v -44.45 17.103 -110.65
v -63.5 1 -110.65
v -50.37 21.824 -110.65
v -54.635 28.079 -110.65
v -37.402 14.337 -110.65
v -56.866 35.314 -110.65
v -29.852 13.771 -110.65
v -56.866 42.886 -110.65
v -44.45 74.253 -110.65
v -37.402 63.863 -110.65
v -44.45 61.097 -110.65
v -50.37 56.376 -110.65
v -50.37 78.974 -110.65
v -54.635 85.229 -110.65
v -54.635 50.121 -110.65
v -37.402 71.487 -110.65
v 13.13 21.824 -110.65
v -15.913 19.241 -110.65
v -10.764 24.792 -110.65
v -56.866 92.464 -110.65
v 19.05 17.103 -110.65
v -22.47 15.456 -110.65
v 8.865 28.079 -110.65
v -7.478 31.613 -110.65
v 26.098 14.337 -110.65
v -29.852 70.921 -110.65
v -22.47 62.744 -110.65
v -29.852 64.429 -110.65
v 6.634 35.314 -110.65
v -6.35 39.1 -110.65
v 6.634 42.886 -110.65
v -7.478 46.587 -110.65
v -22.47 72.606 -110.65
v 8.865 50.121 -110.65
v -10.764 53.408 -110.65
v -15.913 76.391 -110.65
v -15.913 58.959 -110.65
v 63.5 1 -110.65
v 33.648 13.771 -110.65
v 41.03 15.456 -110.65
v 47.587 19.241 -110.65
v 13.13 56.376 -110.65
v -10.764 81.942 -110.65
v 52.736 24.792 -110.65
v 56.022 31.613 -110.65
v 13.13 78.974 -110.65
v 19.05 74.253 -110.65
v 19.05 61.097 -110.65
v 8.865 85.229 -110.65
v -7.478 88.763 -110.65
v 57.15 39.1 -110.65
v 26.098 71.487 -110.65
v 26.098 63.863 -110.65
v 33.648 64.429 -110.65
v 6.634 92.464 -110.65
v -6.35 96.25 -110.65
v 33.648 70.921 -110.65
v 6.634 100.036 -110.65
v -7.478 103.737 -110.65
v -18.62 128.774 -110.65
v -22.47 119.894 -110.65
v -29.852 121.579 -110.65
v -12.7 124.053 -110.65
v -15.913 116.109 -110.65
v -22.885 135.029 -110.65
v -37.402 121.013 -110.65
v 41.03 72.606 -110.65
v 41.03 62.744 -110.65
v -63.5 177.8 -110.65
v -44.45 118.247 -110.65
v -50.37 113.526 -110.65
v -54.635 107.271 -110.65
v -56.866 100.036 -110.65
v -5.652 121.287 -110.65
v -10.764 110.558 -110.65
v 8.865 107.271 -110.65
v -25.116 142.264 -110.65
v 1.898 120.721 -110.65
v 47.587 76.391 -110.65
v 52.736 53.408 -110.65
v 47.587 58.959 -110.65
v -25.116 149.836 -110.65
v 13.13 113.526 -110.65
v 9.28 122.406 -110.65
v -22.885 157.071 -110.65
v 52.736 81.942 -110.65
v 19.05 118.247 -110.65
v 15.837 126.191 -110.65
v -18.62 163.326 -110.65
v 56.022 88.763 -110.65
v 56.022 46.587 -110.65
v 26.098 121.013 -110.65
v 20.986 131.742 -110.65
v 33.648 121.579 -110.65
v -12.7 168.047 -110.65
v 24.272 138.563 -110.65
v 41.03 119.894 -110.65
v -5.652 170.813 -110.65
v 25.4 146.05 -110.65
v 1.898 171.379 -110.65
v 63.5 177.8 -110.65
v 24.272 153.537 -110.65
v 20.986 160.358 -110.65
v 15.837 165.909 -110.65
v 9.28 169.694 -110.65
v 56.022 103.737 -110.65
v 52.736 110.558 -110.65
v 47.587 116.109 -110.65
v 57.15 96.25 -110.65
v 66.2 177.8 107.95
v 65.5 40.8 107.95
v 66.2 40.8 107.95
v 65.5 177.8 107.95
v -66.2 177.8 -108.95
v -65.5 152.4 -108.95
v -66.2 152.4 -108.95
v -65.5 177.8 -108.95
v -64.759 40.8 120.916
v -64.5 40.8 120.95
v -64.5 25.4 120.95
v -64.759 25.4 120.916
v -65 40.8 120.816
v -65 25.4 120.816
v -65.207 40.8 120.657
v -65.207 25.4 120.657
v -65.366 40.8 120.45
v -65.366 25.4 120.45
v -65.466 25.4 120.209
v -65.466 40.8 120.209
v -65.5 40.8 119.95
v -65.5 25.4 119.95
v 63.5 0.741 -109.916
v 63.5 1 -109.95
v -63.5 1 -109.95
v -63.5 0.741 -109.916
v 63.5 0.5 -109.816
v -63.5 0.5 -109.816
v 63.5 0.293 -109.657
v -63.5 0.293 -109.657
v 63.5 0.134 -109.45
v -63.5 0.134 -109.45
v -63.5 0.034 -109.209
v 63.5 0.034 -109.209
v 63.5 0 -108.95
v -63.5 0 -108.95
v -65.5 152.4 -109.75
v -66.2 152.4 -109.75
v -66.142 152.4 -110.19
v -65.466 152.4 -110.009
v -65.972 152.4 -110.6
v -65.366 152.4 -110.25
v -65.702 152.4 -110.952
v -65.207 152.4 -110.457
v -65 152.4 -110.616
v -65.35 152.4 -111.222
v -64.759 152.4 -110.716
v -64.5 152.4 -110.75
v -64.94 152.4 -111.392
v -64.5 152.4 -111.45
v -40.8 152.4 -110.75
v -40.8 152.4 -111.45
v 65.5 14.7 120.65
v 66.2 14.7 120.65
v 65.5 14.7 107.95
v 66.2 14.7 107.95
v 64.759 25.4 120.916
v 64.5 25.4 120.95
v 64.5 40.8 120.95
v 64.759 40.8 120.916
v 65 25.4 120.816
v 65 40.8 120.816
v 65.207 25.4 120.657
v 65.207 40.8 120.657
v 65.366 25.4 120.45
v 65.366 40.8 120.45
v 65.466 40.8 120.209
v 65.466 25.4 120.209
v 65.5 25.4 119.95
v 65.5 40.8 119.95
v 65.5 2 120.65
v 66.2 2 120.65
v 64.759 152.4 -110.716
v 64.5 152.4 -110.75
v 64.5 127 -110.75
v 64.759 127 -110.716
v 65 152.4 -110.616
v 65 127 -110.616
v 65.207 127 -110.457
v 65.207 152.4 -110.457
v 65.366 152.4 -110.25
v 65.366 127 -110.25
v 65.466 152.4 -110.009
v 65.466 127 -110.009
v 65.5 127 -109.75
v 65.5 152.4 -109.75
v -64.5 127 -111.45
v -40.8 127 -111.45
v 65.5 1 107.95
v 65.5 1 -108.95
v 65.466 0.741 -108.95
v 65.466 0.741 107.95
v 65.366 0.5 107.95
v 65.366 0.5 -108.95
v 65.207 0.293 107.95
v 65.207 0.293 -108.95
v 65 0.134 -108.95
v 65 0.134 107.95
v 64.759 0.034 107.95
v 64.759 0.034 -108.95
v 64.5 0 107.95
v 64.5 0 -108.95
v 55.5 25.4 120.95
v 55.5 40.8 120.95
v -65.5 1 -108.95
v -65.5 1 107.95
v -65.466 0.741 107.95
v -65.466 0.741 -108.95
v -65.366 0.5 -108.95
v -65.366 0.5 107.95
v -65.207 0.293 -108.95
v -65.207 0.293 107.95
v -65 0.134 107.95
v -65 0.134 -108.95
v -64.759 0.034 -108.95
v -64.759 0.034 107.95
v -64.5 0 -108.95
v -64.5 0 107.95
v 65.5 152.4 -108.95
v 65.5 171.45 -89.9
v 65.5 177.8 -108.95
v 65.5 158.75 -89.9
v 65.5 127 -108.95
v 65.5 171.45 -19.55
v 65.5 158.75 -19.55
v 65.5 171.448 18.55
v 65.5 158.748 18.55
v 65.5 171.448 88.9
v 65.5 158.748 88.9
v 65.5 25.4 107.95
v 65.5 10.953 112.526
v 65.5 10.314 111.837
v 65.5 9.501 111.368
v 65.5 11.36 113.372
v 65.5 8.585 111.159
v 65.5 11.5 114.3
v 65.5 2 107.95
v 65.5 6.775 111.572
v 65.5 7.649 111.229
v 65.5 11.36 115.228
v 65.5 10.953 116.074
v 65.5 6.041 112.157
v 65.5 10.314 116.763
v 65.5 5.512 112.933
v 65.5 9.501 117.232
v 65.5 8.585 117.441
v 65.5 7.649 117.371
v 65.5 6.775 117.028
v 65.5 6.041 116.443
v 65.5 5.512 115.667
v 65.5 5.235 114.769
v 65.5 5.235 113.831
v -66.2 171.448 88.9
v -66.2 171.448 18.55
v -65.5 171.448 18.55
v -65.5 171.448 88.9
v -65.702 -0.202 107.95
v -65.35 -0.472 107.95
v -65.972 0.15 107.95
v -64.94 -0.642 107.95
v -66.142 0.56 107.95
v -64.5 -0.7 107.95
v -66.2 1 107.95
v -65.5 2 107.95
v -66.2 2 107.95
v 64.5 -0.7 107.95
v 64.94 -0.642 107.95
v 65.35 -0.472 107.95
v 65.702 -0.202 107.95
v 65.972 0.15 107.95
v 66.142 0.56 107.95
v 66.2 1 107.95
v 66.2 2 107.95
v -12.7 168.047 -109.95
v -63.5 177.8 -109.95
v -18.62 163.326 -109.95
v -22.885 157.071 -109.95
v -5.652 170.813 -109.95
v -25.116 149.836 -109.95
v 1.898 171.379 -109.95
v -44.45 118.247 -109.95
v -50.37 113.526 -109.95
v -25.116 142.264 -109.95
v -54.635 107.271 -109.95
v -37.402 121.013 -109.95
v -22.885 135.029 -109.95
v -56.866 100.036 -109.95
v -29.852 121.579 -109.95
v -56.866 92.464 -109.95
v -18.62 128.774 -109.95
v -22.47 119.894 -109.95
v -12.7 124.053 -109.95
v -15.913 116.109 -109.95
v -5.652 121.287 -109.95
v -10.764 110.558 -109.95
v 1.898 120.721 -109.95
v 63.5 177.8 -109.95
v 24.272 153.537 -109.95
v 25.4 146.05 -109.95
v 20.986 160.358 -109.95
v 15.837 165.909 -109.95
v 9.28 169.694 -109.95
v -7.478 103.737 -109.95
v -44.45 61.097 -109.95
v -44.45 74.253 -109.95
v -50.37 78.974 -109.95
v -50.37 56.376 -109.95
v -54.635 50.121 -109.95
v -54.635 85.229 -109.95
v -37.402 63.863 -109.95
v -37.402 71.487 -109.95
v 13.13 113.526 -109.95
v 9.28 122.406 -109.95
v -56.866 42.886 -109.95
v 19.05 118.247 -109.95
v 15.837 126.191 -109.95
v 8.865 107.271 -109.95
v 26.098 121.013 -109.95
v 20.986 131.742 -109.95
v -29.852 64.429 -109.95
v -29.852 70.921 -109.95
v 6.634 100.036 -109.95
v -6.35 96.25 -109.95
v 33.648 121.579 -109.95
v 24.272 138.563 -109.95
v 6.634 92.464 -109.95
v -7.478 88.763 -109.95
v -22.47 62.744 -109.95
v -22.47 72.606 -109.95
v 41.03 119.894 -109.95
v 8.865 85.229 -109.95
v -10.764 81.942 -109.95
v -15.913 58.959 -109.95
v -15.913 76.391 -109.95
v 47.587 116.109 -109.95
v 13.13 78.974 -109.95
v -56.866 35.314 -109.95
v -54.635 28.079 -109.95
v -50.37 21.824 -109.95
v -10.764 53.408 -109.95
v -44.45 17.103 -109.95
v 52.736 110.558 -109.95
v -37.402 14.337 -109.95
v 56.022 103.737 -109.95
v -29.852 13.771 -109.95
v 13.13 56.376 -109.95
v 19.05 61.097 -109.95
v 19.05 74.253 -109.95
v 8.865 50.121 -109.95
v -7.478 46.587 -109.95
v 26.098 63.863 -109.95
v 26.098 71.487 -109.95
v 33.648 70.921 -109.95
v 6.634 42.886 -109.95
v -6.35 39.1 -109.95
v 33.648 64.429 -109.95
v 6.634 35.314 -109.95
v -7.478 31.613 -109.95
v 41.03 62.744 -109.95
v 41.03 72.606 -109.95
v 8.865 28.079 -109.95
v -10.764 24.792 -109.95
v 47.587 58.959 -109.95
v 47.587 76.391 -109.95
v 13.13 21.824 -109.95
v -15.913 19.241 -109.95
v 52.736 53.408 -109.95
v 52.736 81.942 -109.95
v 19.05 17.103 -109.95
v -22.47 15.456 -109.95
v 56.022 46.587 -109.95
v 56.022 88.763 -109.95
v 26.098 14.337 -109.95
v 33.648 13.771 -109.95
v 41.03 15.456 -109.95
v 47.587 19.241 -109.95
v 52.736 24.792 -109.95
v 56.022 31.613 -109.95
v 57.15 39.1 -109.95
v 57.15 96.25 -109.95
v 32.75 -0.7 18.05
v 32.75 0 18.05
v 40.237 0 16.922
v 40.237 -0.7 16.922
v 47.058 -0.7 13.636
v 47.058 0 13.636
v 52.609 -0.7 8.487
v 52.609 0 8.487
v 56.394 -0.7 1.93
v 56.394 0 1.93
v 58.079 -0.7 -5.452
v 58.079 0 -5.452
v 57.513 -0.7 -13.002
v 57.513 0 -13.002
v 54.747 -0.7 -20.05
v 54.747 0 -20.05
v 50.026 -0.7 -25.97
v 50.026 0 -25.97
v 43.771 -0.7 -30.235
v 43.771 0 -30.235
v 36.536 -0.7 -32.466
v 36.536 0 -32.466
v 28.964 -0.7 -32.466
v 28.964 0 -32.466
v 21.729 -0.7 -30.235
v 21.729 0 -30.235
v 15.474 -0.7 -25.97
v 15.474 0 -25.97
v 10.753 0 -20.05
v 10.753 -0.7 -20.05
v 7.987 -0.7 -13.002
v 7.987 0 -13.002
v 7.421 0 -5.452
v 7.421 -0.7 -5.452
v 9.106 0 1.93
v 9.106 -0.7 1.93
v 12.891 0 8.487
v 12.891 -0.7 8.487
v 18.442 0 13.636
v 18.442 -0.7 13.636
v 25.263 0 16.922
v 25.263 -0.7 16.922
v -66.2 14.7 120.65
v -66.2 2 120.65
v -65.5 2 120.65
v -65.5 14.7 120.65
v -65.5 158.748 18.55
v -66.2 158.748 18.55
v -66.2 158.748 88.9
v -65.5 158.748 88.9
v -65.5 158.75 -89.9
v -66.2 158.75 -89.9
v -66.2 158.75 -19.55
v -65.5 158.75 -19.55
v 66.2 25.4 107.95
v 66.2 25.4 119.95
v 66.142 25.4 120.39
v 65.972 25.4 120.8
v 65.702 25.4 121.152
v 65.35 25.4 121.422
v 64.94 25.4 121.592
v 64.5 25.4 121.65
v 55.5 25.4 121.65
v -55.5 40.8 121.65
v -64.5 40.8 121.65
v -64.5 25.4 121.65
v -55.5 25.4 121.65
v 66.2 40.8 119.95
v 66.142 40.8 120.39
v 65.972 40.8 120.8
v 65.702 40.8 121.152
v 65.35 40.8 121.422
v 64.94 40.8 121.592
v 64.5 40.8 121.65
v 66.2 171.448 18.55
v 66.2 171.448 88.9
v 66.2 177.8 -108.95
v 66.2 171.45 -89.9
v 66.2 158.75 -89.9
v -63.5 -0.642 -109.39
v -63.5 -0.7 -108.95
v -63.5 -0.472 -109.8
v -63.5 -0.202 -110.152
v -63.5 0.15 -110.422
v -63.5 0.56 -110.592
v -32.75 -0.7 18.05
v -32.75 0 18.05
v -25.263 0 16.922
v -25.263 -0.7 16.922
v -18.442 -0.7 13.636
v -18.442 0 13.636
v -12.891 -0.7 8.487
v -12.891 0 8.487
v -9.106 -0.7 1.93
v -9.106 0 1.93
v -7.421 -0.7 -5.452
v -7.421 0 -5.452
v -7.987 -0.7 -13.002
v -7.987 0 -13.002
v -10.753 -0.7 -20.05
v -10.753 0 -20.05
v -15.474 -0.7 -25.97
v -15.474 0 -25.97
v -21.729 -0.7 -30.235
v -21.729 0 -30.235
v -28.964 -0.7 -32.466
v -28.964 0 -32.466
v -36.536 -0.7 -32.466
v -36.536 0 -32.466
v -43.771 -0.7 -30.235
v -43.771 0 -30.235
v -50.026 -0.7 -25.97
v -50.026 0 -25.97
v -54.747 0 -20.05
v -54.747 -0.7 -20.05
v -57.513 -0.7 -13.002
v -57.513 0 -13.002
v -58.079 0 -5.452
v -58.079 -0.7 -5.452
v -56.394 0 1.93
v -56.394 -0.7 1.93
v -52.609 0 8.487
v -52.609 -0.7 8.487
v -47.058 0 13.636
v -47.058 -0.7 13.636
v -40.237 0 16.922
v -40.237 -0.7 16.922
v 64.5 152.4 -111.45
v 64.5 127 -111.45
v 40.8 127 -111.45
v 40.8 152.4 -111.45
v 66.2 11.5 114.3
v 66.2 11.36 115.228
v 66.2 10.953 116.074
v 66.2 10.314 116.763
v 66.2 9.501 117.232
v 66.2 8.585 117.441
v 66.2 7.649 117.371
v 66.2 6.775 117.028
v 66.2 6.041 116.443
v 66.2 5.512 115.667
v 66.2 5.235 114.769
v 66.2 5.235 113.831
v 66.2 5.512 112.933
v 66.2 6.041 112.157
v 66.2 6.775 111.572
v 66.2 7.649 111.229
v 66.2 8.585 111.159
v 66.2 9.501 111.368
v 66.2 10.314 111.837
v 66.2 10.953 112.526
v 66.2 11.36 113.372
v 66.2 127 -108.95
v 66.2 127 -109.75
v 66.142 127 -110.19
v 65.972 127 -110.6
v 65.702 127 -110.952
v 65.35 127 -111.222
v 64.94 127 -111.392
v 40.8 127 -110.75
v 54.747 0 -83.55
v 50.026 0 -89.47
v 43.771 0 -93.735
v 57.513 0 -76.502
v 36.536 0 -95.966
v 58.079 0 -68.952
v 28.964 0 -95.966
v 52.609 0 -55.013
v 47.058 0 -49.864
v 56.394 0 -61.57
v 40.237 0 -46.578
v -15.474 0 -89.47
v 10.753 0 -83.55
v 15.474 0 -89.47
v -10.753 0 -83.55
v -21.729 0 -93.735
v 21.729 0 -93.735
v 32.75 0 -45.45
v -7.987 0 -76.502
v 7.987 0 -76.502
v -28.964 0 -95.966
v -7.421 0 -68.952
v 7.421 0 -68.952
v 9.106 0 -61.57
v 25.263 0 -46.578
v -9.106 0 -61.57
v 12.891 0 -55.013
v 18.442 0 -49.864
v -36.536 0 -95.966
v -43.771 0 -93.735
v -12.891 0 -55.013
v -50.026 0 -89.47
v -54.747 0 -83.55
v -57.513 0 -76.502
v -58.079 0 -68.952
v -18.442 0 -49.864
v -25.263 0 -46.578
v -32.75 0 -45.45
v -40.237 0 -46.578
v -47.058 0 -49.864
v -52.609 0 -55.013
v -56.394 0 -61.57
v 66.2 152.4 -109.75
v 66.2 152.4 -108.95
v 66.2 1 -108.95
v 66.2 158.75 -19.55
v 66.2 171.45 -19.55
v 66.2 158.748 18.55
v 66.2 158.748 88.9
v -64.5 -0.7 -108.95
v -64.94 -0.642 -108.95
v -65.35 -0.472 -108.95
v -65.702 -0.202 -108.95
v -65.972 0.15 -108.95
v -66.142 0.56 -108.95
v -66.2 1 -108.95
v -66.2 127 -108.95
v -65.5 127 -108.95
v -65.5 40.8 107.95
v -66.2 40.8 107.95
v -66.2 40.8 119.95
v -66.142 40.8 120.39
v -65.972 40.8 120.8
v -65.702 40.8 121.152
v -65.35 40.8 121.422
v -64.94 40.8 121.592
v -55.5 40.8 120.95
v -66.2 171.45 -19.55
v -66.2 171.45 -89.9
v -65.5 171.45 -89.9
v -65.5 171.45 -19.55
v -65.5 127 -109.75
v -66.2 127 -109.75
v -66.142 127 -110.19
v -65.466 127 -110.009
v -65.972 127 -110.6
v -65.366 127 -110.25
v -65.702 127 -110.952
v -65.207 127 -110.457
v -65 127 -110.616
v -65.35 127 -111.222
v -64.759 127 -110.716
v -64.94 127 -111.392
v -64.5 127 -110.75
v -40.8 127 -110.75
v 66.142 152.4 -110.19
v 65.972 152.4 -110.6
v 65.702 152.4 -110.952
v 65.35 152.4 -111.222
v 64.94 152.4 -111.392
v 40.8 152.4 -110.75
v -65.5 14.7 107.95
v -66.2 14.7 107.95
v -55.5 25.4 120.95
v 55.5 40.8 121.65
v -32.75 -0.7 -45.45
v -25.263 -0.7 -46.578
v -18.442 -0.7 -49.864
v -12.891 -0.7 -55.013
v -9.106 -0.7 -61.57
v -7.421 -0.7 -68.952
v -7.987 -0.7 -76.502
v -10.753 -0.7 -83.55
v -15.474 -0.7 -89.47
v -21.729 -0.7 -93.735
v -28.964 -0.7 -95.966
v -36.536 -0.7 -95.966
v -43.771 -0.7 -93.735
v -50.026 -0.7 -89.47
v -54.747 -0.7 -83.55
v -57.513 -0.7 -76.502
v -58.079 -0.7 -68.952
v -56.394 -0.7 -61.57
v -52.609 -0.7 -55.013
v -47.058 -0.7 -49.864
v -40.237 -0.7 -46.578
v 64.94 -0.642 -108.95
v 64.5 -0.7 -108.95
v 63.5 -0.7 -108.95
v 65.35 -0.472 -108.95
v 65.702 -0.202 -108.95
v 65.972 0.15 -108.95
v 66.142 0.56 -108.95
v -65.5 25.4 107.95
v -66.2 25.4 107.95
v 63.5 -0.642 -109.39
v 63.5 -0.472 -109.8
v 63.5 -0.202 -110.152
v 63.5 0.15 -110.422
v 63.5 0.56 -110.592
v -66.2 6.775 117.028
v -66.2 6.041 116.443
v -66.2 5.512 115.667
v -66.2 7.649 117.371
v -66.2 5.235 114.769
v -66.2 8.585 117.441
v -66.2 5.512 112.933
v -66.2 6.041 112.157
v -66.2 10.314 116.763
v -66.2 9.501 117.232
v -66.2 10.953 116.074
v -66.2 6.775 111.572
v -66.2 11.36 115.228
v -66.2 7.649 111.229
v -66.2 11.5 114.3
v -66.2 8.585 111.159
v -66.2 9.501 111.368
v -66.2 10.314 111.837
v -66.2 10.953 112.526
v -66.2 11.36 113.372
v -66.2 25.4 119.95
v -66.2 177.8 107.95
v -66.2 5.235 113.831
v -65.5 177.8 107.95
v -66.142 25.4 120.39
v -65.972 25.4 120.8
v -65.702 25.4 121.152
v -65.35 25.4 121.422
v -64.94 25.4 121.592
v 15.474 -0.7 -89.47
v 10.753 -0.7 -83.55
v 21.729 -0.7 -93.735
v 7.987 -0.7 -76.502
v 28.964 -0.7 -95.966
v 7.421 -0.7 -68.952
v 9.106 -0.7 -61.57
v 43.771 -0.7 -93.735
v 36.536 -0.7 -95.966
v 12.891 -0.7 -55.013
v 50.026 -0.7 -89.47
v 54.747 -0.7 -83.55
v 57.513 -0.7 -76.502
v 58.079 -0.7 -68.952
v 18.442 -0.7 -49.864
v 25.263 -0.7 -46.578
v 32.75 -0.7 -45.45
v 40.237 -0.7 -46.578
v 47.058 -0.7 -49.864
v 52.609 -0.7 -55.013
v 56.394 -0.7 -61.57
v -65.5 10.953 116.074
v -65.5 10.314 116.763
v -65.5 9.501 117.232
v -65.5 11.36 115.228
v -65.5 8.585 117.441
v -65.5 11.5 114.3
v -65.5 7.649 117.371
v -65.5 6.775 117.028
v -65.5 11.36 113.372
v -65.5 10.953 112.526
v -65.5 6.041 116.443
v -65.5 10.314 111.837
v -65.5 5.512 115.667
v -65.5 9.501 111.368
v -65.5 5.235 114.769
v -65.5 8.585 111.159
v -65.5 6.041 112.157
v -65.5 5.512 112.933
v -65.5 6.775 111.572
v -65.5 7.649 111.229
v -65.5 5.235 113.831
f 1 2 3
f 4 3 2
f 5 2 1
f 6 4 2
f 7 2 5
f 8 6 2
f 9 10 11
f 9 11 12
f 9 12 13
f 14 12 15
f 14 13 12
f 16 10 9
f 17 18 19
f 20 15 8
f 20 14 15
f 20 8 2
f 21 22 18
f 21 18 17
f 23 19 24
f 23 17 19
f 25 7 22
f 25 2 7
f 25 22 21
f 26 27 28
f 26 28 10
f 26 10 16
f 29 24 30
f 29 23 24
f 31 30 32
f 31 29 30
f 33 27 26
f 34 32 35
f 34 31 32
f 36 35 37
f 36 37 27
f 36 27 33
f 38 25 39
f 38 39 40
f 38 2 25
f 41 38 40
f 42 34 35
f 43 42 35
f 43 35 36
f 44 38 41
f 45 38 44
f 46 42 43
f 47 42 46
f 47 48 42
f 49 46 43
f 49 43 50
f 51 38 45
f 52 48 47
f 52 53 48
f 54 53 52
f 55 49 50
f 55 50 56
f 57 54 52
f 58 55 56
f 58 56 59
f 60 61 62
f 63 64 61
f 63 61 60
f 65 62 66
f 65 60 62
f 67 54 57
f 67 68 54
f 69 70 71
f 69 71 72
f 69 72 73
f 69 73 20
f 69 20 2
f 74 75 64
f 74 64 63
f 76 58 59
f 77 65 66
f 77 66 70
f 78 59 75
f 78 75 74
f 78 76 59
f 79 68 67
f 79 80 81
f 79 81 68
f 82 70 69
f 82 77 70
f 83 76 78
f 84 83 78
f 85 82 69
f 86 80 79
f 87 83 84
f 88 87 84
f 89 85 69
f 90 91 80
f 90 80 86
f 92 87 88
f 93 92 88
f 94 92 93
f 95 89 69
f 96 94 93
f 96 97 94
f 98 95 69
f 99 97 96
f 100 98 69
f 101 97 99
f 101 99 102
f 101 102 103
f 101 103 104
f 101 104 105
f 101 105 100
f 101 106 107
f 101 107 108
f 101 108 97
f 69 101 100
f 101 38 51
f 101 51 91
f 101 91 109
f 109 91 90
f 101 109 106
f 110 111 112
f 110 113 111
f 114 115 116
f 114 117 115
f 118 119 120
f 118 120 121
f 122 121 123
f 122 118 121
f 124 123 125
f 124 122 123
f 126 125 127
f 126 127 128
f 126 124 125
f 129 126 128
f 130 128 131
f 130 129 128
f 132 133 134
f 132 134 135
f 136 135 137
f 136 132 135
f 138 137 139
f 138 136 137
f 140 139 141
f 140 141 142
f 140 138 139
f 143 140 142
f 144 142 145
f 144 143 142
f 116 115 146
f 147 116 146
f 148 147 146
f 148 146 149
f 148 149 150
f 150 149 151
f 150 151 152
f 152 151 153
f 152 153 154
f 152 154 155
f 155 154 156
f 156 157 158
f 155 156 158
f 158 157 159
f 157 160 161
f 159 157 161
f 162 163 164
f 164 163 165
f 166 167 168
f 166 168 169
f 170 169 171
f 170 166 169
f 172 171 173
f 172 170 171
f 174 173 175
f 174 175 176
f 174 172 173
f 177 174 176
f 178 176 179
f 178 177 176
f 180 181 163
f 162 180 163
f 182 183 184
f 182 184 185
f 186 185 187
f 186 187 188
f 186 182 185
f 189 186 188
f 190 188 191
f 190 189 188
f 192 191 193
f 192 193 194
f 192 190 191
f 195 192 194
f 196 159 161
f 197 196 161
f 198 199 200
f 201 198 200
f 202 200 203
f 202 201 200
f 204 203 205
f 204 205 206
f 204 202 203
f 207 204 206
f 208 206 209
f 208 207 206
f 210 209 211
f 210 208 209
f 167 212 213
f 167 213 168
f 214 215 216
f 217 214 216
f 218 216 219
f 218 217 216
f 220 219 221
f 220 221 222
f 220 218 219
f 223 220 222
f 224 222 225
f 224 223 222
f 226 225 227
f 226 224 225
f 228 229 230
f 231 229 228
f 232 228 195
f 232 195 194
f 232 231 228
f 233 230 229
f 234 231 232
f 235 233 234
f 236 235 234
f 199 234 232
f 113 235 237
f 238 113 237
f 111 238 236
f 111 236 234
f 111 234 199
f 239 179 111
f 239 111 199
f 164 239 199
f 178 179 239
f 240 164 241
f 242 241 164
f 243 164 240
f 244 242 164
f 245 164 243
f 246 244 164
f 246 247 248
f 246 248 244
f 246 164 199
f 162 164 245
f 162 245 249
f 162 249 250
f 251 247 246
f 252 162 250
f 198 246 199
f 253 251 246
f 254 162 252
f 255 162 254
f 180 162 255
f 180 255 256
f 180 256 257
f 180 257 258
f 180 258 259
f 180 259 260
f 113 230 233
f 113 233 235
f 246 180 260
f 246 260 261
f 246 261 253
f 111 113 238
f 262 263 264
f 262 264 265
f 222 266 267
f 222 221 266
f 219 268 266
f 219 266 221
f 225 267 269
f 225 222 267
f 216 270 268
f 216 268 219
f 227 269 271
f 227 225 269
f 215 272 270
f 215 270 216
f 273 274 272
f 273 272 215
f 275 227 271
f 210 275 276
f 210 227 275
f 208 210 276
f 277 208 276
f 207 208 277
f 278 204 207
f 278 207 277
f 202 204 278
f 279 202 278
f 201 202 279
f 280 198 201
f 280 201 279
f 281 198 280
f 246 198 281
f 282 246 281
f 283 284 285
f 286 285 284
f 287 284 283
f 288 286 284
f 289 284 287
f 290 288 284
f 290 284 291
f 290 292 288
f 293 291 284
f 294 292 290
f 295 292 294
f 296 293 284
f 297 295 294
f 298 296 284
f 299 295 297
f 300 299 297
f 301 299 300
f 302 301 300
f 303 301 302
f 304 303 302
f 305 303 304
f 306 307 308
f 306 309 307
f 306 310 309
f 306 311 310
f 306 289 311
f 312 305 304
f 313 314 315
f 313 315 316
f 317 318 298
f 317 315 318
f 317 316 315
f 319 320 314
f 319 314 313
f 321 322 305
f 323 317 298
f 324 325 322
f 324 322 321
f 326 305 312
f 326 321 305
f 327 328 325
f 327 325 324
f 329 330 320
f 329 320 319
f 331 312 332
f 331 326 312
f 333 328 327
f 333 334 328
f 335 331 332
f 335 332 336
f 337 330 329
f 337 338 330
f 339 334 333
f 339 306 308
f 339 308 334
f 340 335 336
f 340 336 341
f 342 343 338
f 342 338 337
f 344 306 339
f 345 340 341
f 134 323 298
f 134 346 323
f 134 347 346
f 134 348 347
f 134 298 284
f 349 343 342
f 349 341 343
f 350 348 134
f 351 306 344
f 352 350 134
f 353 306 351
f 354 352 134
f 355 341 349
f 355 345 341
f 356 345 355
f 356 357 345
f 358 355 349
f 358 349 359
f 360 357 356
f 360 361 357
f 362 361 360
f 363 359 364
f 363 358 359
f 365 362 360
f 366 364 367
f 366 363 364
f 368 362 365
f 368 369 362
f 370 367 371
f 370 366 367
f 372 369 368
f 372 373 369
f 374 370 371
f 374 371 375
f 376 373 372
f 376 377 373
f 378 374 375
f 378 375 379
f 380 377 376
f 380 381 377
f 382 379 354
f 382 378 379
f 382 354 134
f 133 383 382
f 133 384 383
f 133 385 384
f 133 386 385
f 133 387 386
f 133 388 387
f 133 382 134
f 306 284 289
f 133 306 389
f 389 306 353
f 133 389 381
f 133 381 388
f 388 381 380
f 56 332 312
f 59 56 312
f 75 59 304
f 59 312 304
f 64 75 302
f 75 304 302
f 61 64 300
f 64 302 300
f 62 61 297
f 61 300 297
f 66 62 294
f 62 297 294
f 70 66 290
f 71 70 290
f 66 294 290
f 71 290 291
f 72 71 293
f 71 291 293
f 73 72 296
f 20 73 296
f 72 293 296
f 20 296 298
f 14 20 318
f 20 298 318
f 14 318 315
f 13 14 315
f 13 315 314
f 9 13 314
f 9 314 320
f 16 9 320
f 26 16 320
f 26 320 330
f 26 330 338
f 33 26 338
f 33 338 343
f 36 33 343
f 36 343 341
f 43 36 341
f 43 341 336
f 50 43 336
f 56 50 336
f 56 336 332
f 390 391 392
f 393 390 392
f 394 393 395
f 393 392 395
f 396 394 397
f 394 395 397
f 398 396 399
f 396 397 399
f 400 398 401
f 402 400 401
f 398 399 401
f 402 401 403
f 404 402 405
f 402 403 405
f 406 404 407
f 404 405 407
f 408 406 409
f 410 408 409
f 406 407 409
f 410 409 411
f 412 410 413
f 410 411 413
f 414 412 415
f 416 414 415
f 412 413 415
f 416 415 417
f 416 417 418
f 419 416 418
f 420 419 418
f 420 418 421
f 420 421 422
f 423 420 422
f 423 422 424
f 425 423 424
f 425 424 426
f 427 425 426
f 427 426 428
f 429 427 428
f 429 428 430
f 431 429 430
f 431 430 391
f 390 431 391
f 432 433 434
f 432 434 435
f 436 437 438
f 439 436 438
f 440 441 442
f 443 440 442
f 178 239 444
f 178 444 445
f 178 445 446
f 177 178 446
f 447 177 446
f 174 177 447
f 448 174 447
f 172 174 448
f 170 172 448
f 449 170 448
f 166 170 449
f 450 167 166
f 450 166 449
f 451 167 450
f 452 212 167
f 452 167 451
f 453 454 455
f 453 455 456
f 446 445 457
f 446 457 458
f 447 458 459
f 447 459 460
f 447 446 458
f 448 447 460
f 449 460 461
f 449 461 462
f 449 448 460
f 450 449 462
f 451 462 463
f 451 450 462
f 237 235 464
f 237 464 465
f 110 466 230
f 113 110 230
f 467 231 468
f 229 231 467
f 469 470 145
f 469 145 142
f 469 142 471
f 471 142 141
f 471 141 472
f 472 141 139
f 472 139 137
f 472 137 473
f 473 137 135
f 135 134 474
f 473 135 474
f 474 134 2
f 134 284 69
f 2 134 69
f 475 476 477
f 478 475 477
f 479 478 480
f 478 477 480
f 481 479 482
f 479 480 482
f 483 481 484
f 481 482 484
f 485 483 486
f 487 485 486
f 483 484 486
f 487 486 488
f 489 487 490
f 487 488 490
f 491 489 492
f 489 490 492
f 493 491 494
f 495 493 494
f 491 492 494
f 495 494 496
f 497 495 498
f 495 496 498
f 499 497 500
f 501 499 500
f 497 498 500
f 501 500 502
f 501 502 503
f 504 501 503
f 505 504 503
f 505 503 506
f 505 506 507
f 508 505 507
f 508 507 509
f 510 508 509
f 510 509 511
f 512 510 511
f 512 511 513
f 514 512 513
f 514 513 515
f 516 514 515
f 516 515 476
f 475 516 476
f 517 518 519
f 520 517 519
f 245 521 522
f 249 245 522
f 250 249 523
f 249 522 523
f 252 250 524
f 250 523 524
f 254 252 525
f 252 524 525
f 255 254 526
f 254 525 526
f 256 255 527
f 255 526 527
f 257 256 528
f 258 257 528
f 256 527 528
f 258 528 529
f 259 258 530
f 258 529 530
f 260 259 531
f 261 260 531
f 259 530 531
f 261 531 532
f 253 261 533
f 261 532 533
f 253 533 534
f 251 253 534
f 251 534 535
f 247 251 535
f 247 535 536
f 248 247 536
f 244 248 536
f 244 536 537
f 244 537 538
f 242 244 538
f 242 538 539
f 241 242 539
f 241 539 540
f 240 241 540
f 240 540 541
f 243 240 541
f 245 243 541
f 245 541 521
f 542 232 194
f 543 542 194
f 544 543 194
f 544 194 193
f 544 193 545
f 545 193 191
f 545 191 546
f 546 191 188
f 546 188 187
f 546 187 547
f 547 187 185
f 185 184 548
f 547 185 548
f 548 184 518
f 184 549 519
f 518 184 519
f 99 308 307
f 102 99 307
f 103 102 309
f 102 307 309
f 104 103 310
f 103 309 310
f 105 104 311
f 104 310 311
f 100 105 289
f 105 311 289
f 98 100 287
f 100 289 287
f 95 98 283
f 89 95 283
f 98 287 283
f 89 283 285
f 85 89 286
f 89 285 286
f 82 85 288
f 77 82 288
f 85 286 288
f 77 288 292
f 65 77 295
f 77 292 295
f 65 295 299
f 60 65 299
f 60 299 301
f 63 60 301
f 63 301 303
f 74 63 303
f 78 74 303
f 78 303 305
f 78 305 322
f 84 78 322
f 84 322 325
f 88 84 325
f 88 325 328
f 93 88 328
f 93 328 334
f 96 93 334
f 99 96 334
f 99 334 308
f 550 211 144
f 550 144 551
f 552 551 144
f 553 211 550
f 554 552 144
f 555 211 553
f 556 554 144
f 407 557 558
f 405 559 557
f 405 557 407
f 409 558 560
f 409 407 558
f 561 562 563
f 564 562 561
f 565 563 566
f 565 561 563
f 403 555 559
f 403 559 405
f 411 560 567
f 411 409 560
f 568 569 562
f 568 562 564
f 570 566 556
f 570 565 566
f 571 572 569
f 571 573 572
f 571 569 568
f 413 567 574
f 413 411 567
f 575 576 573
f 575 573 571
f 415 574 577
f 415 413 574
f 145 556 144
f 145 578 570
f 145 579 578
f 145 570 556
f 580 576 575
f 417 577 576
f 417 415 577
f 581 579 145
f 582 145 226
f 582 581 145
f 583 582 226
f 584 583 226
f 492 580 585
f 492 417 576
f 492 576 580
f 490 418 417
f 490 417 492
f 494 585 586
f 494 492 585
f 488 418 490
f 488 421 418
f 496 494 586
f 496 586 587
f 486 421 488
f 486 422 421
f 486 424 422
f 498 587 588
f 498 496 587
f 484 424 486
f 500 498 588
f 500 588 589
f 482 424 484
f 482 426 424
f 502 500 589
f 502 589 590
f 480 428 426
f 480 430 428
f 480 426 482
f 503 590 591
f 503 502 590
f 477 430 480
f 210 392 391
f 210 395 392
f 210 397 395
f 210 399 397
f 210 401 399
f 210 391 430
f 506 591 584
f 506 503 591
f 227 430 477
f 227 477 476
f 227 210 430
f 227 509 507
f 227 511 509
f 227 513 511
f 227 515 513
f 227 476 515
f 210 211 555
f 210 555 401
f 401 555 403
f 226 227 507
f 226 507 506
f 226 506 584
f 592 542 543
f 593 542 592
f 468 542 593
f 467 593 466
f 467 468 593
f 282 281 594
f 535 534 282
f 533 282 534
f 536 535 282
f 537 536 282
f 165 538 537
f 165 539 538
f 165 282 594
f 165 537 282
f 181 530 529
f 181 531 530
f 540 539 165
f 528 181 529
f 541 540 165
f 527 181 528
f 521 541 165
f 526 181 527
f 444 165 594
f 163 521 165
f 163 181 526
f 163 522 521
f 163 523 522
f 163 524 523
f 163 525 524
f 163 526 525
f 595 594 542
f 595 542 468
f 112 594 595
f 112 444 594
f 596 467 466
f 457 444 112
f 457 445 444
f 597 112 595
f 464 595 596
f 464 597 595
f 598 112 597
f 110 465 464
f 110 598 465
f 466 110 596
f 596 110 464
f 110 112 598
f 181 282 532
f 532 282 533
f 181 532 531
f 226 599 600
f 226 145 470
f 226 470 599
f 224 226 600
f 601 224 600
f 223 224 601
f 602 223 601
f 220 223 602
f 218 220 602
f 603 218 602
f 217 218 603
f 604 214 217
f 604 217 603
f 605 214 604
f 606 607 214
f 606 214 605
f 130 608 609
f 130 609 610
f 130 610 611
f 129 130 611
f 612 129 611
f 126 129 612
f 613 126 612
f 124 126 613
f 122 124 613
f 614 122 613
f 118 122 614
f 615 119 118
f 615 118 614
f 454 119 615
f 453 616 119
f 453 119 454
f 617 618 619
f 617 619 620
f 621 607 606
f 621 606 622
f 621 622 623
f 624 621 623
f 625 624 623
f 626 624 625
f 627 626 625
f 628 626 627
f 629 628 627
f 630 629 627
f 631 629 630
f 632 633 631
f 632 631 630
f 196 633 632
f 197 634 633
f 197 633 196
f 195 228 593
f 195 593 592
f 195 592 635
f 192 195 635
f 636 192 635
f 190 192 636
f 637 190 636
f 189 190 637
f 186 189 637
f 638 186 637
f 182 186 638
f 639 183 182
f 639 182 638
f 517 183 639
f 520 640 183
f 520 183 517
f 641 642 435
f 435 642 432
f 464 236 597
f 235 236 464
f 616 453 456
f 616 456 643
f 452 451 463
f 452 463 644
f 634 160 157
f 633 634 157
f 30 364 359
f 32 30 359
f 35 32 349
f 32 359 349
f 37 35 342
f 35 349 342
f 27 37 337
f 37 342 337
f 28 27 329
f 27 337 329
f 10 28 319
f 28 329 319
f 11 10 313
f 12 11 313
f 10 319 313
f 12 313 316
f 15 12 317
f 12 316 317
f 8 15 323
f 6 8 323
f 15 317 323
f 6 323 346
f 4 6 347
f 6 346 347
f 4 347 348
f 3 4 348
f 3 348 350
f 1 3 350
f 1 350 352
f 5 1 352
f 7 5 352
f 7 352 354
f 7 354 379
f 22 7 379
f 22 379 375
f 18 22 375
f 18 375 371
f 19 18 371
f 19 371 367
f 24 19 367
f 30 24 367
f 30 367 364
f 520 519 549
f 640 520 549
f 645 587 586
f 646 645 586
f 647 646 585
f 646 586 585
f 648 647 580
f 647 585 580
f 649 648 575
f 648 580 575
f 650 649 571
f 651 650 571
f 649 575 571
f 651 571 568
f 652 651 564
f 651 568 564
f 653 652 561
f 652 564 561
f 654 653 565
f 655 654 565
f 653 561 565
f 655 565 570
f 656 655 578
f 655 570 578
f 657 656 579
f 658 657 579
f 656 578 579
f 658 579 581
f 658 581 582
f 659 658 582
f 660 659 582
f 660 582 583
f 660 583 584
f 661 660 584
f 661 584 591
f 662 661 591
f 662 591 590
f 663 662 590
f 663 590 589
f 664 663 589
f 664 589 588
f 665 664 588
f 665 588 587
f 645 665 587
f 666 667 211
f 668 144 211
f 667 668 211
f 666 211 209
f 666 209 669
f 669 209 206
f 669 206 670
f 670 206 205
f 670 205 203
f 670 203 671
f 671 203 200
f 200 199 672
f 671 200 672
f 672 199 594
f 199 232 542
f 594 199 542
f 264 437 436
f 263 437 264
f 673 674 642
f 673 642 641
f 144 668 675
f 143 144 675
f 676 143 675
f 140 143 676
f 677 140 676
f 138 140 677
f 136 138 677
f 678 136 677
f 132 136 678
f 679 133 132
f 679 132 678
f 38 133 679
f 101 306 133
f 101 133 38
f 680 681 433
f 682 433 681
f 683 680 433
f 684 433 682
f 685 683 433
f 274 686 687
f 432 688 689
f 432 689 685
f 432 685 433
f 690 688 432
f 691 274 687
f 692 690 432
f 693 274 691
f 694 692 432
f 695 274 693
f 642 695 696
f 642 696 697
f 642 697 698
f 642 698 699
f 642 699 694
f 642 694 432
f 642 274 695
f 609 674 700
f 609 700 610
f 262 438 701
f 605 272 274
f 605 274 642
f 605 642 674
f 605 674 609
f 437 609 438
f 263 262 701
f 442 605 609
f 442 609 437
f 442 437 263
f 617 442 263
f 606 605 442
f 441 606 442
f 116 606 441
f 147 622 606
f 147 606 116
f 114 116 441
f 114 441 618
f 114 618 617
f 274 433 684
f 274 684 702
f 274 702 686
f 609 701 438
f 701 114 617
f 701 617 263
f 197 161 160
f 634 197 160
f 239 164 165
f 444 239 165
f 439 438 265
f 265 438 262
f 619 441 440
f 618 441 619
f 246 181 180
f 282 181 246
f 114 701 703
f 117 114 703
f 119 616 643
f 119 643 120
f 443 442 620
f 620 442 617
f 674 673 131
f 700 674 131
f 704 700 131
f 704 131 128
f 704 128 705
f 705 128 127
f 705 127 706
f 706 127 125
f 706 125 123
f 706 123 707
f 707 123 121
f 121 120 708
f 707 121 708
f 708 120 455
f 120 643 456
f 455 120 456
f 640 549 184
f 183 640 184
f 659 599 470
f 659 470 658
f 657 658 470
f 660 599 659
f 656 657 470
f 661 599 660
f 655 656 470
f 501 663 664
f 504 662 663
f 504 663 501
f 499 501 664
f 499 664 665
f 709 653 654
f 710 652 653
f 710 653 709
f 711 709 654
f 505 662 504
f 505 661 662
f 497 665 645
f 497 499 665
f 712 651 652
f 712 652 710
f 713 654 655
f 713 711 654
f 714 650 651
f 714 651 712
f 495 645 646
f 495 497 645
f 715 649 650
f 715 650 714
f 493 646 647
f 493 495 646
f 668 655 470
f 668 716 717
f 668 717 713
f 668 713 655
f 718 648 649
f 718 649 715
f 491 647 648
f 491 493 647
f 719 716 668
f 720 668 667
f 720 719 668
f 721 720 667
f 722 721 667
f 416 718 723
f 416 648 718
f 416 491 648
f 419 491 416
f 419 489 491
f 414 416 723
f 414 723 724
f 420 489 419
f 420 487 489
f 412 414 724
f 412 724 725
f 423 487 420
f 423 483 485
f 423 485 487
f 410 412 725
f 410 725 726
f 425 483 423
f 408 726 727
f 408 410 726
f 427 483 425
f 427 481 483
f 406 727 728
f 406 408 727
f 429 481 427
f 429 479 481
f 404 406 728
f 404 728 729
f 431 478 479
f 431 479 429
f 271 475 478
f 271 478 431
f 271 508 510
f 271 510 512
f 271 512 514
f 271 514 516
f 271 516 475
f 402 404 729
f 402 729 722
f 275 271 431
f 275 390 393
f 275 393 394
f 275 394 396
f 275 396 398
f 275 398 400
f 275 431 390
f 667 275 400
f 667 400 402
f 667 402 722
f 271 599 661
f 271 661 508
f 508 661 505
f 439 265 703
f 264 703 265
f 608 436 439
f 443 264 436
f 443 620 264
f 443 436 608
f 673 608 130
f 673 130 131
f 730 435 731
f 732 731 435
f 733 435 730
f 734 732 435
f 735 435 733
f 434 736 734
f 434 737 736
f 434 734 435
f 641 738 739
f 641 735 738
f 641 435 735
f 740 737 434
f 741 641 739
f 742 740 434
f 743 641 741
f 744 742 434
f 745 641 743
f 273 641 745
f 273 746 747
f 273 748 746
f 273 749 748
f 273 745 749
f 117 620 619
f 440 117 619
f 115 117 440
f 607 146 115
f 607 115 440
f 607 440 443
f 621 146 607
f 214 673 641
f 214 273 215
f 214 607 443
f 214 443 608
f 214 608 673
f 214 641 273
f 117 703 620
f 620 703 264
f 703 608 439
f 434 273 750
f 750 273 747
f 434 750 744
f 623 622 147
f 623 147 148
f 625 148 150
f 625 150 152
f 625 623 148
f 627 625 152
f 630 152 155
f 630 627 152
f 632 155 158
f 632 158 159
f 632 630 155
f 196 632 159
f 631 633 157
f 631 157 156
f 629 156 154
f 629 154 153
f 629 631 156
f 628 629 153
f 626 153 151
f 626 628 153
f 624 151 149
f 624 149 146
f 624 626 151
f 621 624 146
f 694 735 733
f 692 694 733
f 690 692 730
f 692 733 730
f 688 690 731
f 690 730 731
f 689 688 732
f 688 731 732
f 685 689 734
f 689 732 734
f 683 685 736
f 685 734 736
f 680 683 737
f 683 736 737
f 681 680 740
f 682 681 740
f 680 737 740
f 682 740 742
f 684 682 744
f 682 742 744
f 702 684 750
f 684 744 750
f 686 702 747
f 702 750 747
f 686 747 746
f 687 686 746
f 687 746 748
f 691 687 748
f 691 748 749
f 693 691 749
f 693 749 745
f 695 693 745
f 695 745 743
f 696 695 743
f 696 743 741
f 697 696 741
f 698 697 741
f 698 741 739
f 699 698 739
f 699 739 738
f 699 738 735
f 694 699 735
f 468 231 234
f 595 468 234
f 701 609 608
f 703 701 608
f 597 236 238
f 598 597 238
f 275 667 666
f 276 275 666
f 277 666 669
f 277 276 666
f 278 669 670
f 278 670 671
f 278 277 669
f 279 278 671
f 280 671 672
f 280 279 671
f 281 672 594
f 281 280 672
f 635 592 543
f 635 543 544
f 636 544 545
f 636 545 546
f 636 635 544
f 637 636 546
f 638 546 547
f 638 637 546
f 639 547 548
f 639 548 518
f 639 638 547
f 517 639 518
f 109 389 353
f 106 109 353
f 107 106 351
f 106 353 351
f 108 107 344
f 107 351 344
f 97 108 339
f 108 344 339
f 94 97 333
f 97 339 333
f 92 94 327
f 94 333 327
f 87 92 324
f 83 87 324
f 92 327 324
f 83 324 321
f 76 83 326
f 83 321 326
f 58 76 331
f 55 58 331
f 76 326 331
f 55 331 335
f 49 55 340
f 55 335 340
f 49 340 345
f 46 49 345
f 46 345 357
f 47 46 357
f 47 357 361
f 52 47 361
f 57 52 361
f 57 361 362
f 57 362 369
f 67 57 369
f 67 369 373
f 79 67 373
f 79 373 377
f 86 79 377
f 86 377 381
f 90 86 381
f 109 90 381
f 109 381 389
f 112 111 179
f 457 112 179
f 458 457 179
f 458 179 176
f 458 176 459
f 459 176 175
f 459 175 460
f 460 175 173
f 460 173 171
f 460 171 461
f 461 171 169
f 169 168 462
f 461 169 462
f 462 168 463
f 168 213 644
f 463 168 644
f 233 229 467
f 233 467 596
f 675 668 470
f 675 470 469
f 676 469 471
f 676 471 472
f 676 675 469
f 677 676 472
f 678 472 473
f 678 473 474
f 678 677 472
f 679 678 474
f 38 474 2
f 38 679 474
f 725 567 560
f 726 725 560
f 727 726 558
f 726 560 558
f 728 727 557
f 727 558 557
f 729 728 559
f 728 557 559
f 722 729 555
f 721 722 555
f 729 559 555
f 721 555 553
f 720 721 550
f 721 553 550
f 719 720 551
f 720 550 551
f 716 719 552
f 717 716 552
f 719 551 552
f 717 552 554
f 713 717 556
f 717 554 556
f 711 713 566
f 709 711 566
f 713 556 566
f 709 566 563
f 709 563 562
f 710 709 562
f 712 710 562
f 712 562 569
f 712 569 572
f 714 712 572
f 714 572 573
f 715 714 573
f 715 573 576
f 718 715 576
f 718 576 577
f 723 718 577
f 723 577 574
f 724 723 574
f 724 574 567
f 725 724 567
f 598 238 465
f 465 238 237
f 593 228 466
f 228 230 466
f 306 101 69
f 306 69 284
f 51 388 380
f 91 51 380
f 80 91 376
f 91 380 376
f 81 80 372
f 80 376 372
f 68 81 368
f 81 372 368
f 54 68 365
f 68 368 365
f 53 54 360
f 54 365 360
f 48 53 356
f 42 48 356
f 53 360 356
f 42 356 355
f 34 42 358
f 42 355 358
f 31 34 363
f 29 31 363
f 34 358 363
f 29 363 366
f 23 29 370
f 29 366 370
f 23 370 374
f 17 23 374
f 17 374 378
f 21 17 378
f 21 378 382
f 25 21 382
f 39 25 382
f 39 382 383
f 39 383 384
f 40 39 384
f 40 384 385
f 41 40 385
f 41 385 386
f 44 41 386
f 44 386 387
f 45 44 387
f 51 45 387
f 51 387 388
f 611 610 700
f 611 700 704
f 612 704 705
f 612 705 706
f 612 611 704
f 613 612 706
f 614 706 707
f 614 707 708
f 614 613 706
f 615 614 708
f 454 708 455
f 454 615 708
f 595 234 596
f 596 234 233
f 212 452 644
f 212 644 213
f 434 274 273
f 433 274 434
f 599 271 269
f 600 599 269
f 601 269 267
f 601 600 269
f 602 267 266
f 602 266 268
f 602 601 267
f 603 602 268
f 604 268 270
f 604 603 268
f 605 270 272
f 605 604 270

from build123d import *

# Parameters (mm, degrees)
SKETCH2_W           = 127
SKETCH2_H           = 215.9
BASE_FLANGE1_DEPTH  = 0.7
EDGE_FLANGE4_DEPTH  = 127
EDGE_FLANGE5_DEPTH  = 216.9
EDGE_FLANGE6_DEPTH  = 216.9
EDGE_FLANGE7_DEPTH  = 25.4
EDGE_FLANGE9_DEPTH  = 25.4
EDGE_FLANGE10_DEPTH = 15.4
EDGE_FLANGE11_DEPTH = 15.4
SKETCH76_W          = 12.7
SKETCH76_H          = 12.7
TAB1_DEPTH          = 0.7
SKETCH79_W          = 12.7
SKETCH79_H          = 12.7
TAB2_DEPTH          = 0.7
SKETCH86_R          = 3.15
CUT_EXTRUDE3_DEPTH  = 253.866214627
SKETCH87_W          = 70.35
SKETCH87_H          = 12.7
CUT_EXTRUDE4_DEPTH  = 253.866214627
SKETCH88_R          = 25.4
CUT_EXTRUDE5_DEPTH  = 10
SKETCH90_R          = 25.4
CUT_EXTRUDE6_DEPTH  = 300.389111358


# Sheet-metal steps are written as plain solids
with BuildPart() as part:
    # Sketch2 → Base-Flange1 (new body)
    with BuildSketch(Plane(origin=(0, 0, 0), x_dir=(1, 0, 0), z_dir=(0, 1, 0))):
        Rectangle(SKETCH2_W, SKETCH2_H)
    extrude(amount=-BASE_FLANGE1_DEPTH)

    # Edge-Flange4 section (across the edge) → Edge-Flange4 (add)
    with BuildSketch(Plane(origin=(63.5, 0, -109.95), x_dir=(0, 0, 1), z_dir=(-1, 0, 0))):
        with BuildLine():
            Line((-0.7, 1), (-0.7, 177.8))
            Line((-0.7, 177.8), (0, 177.8))
            Line((0, 177.8), (0, 1))
            ThreePointArc((0, 1), (0.292893219, 0.292893219), (1, 0))
            Line((1, 0), (2, 0))
            Line((2, 0), (2, -0.7))
            Line((2, -0.7), (1, -0.7))
            ThreePointArc((1, -0.7), (-0.202081528, -0.202081528), (-0.7, 1))
        make_face()
    extrude(amount=EDGE_FLANGE4_DEPTH)

    # Edge-Flange5 section (across the edge) → Edge-Flange5 (add)
    with BuildSketch(Plane(origin=(-65.5, 0, -108.95), x_dir=(1, 0, 0), z_dir=(0, 0, 1))):
        with BuildLine():
            Line((-0.7, 1), (-0.7, 177.8))
            Line((-0.7, 177.8), (0, 177.8))
            Line((0, 177.8), (0, 1))
            ThreePointArc((0, 1), (0.292893219, 0.292893219), (1, 0))
            Line((1, 0), (2, 0))
            Line((2, 0), (2, -0.7))
            Line((2, -0.7), (1, -0.7))
            ThreePointArc((1, -0.7), (-0.202081528, -0.202081528), (-0.7, 1))
        make_face()
    extrude(amount=EDGE_FLANGE5_DEPTH)

    # Edge-Flange6 section (across the edge) → Edge-Flange6 (add)
    with BuildSketch(Plane(origin=(65.5, 0, 107.95), x_dir=(-1, 0, 0), z_dir=(0, 0, -1))):
        with BuildLine():
            Line((-0.7, 1), (-0.7, 177.8))
            Line((-0.7, 177.8), (0, 177.8))
            Line((0, 177.8), (0, 1))
            ThreePointArc((0, 1), (0.292893219, 0.292893219), (1, 0))
            Line((1, 0), (2, 0))
            Line((2, 0), (2, -0.7))
            Line((2, -0.7), (1, -0.7))
            ThreePointArc((1, -0.7), (-0.202081528, -0.202081528), (-0.7, 1))
        make_face()
    extrude(amount=EDGE_FLANGE6_DEPTH)

    # Edge-Flange7 section (across the edge) → Edge-Flange7 (add)
    with BuildSketch(Plane(origin=(-65.5, 127, -110.75), x_dir=(0, 0, 1), z_dir=(0, 1, 0))):
        with BuildLine():
            Line((-0.7, 1), (-0.7, 24.7))
            Line((-0.7, 24.7), (0, 24.7))
            Line((0, 24.7), (0, 1))
            ThreePointArc((0, 1), (0.292893219, 0.292893219), (1, 0))
            Line((1, 0), (1.8, 0))
            Line((1.8, 0), (1.8, -0.7))
            Line((1.8, -0.7), (1, -0.7))
            ThreePointArc((1, -0.7), (-0.202081528, -0.202081528), (-0.7, 1))
        make_face()
    extrude(amount=EDGE_FLANGE7_DEPTH)

    # Edge-Flange9 section (across the edge) → Edge-Flange9 (add)
    with BuildSketch(Plane(origin=(65.5, 152.4, -110.75), x_dir=(0, 0, 1), z_dir=(0, -1, 0))):
        with BuildLine():
            Line((-0.7, 1), (-0.7, 24.7))
            Line((-0.7, 24.7), (0, 24.7))
            Line((0, 24.7), (0, 1))
            ThreePointArc((0, 1), (0.292893219, 0.292893219), (1, 0))
            Line((1, 0), (1.8, 0))
            Line((1.8, 0), (1.8, -0.7))
            Line((1.8, -0.7), (1, -0.7))
            ThreePointArc((1, -0.7), (-0.202081528, -0.202081528), (-0.7, 1))
        make_face()
    extrude(amount=EDGE_FLANGE9_DEPTH)

    # Edge-Flange10 section (across the edge) → Edge-Flange10 (add)
    with BuildSketch(Plane(origin=(65.5, 25.4, 120.95), x_dir=(0, 0, -1), z_dir=(0, 1, 0))):
        with BuildLine():
            Line((-0.7, 1), (-0.7, 10))
            Line((-0.7, 10), (0, 10))
            Line((0, 10), (0, 1))
            ThreePointArc((0, 1), (0.292893219, 0.292893219), (1, 0))
            Line((1, 0), (13, 0))
            Line((13, 0), (13, -0.7))
            Line((13, -0.7), (1, -0.7))
            ThreePointArc((1, -0.7), (-0.202081528, -0.202081528), (-0.7, 1))
        make_face()
    extrude(amount=EDGE_FLANGE10_DEPTH)

    # Edge-Flange11 section (across the edge) → Edge-Flange11 (add)
    with BuildSketch(Plane(origin=(-65.5, 40.8, 120.95), x_dir=(0, 0, -1), z_dir=(0, -1, 0))):
        with BuildLine():
            Line((-0.7, 1), (-0.7, 10))
            Line((-0.7, 10), (0, 10))
            Line((0, 10), (0, 1))
            ThreePointArc((0, 1), (0.292893219, 0.292893219), (1, 0))
            Line((1, 0), (13, 0))
            Line((13, 0), (13, -0.7))
            Line((13, -0.7), (1, -0.7))
            ThreePointArc((1, -0.7), (-0.202081528, -0.202081528), (-0.7, 1))
        make_face()
    extrude(amount=EDGE_FLANGE11_DEPTH)

    # Sketch76 → Tab1 (add)
    with BuildSketch(Plane.ZY.offset(66.2)):
        with Locations((114.3, 8.35)):
            Rectangle(SKETCH76_W, SKETCH76_H)
    extrude(amount=-TAB1_DEPTH)

    # Sketch79 → Tab2 (add)
    with BuildSketch(Plane(origin=(66.2, 0, 0), x_dir=(0, 0, -1), z_dir=(1, 0, 0))):
        with Locations((-114.3, 8.35)):
            Rectangle(SKETCH79_W, SKETCH79_H)
    extrude(amount=-TAB2_DEPTH)

    # Sketch86 → Cut-Extrude3 (cut, through all)
    with BuildSketch(Plane(origin=(66.2, 0, 0), x_dir=(0, 0, -1), z_dir=(1, 0, 0))):
        with Locations(Location((-114.3, 8.35, 0), (0, 0, 90))):
            Circle(SKETCH86_R)
    extrude(amount=-CUT_EXTRUDE3_DEPTH, mode=Mode.SUBTRACT)

    # Sketch87 → Cut-Extrude4 (cut, through all)
    with BuildSketch(Plane.ZY.offset(66.2)):
        with Locations((-54.725, 165.1)):
            Rectangle(SKETCH87_W, SKETCH87_H)
        with Locations((53.725, 165.0975)):
            Rectangle(SKETCH87_W, SKETCH87_H)
    extrude(amount=-CUT_EXTRUDE4_DEPTH, mode=Mode.SUBTRACT)

    # Sketch88 → Cut-Extrude5 (cut)
    with BuildSketch(Plane(origin=(0, 0, 0), x_dir=(1, 0, 0), z_dir=(0, 1, 0))):
        with Locations(Location((-32.75, 70.85, 0), (0, 0, 270))):
            Circle(SKETCH88_R)
        with Locations(Location((32.75, 70.85, 0), (0, 0, 270))):
            Circle(SKETCH88_R)
        with Locations(Location((-32.75, 7.35, 0), (0, 0, 270))):
            Circle(SKETCH88_R)
        with Locations(Location((32.75, 7.35, 0), (0, 0, 270))):
            Circle(SKETCH88_R)
    extrude(amount=-CUT_EXTRUDE5_DEPTH, mode=Mode.SUBTRACT)

    # Sketch90 → Cut-Extrude6 (cut, through all)
    with BuildSketch(Plane.XY.offset(-109.95)):
        with Locations((-31.75, 39.1)):
            Circle(SKETCH90_R)
        with Locations((31.75, 39.1)):
            Circle(SKETCH90_R)
        with Locations((-31.75, 96.25)):
            Circle(SKETCH90_R)
        with Locations((31.75, 96.25)):
            Circle(SKETCH90_R)
        with Locations((0, 146.05)):
            Circle(SKETCH90_R)
    extrude(amount=-CUT_EXTRUDE6_DEPTH, mode=Mode.SUBTRACT)


solid = part.part
